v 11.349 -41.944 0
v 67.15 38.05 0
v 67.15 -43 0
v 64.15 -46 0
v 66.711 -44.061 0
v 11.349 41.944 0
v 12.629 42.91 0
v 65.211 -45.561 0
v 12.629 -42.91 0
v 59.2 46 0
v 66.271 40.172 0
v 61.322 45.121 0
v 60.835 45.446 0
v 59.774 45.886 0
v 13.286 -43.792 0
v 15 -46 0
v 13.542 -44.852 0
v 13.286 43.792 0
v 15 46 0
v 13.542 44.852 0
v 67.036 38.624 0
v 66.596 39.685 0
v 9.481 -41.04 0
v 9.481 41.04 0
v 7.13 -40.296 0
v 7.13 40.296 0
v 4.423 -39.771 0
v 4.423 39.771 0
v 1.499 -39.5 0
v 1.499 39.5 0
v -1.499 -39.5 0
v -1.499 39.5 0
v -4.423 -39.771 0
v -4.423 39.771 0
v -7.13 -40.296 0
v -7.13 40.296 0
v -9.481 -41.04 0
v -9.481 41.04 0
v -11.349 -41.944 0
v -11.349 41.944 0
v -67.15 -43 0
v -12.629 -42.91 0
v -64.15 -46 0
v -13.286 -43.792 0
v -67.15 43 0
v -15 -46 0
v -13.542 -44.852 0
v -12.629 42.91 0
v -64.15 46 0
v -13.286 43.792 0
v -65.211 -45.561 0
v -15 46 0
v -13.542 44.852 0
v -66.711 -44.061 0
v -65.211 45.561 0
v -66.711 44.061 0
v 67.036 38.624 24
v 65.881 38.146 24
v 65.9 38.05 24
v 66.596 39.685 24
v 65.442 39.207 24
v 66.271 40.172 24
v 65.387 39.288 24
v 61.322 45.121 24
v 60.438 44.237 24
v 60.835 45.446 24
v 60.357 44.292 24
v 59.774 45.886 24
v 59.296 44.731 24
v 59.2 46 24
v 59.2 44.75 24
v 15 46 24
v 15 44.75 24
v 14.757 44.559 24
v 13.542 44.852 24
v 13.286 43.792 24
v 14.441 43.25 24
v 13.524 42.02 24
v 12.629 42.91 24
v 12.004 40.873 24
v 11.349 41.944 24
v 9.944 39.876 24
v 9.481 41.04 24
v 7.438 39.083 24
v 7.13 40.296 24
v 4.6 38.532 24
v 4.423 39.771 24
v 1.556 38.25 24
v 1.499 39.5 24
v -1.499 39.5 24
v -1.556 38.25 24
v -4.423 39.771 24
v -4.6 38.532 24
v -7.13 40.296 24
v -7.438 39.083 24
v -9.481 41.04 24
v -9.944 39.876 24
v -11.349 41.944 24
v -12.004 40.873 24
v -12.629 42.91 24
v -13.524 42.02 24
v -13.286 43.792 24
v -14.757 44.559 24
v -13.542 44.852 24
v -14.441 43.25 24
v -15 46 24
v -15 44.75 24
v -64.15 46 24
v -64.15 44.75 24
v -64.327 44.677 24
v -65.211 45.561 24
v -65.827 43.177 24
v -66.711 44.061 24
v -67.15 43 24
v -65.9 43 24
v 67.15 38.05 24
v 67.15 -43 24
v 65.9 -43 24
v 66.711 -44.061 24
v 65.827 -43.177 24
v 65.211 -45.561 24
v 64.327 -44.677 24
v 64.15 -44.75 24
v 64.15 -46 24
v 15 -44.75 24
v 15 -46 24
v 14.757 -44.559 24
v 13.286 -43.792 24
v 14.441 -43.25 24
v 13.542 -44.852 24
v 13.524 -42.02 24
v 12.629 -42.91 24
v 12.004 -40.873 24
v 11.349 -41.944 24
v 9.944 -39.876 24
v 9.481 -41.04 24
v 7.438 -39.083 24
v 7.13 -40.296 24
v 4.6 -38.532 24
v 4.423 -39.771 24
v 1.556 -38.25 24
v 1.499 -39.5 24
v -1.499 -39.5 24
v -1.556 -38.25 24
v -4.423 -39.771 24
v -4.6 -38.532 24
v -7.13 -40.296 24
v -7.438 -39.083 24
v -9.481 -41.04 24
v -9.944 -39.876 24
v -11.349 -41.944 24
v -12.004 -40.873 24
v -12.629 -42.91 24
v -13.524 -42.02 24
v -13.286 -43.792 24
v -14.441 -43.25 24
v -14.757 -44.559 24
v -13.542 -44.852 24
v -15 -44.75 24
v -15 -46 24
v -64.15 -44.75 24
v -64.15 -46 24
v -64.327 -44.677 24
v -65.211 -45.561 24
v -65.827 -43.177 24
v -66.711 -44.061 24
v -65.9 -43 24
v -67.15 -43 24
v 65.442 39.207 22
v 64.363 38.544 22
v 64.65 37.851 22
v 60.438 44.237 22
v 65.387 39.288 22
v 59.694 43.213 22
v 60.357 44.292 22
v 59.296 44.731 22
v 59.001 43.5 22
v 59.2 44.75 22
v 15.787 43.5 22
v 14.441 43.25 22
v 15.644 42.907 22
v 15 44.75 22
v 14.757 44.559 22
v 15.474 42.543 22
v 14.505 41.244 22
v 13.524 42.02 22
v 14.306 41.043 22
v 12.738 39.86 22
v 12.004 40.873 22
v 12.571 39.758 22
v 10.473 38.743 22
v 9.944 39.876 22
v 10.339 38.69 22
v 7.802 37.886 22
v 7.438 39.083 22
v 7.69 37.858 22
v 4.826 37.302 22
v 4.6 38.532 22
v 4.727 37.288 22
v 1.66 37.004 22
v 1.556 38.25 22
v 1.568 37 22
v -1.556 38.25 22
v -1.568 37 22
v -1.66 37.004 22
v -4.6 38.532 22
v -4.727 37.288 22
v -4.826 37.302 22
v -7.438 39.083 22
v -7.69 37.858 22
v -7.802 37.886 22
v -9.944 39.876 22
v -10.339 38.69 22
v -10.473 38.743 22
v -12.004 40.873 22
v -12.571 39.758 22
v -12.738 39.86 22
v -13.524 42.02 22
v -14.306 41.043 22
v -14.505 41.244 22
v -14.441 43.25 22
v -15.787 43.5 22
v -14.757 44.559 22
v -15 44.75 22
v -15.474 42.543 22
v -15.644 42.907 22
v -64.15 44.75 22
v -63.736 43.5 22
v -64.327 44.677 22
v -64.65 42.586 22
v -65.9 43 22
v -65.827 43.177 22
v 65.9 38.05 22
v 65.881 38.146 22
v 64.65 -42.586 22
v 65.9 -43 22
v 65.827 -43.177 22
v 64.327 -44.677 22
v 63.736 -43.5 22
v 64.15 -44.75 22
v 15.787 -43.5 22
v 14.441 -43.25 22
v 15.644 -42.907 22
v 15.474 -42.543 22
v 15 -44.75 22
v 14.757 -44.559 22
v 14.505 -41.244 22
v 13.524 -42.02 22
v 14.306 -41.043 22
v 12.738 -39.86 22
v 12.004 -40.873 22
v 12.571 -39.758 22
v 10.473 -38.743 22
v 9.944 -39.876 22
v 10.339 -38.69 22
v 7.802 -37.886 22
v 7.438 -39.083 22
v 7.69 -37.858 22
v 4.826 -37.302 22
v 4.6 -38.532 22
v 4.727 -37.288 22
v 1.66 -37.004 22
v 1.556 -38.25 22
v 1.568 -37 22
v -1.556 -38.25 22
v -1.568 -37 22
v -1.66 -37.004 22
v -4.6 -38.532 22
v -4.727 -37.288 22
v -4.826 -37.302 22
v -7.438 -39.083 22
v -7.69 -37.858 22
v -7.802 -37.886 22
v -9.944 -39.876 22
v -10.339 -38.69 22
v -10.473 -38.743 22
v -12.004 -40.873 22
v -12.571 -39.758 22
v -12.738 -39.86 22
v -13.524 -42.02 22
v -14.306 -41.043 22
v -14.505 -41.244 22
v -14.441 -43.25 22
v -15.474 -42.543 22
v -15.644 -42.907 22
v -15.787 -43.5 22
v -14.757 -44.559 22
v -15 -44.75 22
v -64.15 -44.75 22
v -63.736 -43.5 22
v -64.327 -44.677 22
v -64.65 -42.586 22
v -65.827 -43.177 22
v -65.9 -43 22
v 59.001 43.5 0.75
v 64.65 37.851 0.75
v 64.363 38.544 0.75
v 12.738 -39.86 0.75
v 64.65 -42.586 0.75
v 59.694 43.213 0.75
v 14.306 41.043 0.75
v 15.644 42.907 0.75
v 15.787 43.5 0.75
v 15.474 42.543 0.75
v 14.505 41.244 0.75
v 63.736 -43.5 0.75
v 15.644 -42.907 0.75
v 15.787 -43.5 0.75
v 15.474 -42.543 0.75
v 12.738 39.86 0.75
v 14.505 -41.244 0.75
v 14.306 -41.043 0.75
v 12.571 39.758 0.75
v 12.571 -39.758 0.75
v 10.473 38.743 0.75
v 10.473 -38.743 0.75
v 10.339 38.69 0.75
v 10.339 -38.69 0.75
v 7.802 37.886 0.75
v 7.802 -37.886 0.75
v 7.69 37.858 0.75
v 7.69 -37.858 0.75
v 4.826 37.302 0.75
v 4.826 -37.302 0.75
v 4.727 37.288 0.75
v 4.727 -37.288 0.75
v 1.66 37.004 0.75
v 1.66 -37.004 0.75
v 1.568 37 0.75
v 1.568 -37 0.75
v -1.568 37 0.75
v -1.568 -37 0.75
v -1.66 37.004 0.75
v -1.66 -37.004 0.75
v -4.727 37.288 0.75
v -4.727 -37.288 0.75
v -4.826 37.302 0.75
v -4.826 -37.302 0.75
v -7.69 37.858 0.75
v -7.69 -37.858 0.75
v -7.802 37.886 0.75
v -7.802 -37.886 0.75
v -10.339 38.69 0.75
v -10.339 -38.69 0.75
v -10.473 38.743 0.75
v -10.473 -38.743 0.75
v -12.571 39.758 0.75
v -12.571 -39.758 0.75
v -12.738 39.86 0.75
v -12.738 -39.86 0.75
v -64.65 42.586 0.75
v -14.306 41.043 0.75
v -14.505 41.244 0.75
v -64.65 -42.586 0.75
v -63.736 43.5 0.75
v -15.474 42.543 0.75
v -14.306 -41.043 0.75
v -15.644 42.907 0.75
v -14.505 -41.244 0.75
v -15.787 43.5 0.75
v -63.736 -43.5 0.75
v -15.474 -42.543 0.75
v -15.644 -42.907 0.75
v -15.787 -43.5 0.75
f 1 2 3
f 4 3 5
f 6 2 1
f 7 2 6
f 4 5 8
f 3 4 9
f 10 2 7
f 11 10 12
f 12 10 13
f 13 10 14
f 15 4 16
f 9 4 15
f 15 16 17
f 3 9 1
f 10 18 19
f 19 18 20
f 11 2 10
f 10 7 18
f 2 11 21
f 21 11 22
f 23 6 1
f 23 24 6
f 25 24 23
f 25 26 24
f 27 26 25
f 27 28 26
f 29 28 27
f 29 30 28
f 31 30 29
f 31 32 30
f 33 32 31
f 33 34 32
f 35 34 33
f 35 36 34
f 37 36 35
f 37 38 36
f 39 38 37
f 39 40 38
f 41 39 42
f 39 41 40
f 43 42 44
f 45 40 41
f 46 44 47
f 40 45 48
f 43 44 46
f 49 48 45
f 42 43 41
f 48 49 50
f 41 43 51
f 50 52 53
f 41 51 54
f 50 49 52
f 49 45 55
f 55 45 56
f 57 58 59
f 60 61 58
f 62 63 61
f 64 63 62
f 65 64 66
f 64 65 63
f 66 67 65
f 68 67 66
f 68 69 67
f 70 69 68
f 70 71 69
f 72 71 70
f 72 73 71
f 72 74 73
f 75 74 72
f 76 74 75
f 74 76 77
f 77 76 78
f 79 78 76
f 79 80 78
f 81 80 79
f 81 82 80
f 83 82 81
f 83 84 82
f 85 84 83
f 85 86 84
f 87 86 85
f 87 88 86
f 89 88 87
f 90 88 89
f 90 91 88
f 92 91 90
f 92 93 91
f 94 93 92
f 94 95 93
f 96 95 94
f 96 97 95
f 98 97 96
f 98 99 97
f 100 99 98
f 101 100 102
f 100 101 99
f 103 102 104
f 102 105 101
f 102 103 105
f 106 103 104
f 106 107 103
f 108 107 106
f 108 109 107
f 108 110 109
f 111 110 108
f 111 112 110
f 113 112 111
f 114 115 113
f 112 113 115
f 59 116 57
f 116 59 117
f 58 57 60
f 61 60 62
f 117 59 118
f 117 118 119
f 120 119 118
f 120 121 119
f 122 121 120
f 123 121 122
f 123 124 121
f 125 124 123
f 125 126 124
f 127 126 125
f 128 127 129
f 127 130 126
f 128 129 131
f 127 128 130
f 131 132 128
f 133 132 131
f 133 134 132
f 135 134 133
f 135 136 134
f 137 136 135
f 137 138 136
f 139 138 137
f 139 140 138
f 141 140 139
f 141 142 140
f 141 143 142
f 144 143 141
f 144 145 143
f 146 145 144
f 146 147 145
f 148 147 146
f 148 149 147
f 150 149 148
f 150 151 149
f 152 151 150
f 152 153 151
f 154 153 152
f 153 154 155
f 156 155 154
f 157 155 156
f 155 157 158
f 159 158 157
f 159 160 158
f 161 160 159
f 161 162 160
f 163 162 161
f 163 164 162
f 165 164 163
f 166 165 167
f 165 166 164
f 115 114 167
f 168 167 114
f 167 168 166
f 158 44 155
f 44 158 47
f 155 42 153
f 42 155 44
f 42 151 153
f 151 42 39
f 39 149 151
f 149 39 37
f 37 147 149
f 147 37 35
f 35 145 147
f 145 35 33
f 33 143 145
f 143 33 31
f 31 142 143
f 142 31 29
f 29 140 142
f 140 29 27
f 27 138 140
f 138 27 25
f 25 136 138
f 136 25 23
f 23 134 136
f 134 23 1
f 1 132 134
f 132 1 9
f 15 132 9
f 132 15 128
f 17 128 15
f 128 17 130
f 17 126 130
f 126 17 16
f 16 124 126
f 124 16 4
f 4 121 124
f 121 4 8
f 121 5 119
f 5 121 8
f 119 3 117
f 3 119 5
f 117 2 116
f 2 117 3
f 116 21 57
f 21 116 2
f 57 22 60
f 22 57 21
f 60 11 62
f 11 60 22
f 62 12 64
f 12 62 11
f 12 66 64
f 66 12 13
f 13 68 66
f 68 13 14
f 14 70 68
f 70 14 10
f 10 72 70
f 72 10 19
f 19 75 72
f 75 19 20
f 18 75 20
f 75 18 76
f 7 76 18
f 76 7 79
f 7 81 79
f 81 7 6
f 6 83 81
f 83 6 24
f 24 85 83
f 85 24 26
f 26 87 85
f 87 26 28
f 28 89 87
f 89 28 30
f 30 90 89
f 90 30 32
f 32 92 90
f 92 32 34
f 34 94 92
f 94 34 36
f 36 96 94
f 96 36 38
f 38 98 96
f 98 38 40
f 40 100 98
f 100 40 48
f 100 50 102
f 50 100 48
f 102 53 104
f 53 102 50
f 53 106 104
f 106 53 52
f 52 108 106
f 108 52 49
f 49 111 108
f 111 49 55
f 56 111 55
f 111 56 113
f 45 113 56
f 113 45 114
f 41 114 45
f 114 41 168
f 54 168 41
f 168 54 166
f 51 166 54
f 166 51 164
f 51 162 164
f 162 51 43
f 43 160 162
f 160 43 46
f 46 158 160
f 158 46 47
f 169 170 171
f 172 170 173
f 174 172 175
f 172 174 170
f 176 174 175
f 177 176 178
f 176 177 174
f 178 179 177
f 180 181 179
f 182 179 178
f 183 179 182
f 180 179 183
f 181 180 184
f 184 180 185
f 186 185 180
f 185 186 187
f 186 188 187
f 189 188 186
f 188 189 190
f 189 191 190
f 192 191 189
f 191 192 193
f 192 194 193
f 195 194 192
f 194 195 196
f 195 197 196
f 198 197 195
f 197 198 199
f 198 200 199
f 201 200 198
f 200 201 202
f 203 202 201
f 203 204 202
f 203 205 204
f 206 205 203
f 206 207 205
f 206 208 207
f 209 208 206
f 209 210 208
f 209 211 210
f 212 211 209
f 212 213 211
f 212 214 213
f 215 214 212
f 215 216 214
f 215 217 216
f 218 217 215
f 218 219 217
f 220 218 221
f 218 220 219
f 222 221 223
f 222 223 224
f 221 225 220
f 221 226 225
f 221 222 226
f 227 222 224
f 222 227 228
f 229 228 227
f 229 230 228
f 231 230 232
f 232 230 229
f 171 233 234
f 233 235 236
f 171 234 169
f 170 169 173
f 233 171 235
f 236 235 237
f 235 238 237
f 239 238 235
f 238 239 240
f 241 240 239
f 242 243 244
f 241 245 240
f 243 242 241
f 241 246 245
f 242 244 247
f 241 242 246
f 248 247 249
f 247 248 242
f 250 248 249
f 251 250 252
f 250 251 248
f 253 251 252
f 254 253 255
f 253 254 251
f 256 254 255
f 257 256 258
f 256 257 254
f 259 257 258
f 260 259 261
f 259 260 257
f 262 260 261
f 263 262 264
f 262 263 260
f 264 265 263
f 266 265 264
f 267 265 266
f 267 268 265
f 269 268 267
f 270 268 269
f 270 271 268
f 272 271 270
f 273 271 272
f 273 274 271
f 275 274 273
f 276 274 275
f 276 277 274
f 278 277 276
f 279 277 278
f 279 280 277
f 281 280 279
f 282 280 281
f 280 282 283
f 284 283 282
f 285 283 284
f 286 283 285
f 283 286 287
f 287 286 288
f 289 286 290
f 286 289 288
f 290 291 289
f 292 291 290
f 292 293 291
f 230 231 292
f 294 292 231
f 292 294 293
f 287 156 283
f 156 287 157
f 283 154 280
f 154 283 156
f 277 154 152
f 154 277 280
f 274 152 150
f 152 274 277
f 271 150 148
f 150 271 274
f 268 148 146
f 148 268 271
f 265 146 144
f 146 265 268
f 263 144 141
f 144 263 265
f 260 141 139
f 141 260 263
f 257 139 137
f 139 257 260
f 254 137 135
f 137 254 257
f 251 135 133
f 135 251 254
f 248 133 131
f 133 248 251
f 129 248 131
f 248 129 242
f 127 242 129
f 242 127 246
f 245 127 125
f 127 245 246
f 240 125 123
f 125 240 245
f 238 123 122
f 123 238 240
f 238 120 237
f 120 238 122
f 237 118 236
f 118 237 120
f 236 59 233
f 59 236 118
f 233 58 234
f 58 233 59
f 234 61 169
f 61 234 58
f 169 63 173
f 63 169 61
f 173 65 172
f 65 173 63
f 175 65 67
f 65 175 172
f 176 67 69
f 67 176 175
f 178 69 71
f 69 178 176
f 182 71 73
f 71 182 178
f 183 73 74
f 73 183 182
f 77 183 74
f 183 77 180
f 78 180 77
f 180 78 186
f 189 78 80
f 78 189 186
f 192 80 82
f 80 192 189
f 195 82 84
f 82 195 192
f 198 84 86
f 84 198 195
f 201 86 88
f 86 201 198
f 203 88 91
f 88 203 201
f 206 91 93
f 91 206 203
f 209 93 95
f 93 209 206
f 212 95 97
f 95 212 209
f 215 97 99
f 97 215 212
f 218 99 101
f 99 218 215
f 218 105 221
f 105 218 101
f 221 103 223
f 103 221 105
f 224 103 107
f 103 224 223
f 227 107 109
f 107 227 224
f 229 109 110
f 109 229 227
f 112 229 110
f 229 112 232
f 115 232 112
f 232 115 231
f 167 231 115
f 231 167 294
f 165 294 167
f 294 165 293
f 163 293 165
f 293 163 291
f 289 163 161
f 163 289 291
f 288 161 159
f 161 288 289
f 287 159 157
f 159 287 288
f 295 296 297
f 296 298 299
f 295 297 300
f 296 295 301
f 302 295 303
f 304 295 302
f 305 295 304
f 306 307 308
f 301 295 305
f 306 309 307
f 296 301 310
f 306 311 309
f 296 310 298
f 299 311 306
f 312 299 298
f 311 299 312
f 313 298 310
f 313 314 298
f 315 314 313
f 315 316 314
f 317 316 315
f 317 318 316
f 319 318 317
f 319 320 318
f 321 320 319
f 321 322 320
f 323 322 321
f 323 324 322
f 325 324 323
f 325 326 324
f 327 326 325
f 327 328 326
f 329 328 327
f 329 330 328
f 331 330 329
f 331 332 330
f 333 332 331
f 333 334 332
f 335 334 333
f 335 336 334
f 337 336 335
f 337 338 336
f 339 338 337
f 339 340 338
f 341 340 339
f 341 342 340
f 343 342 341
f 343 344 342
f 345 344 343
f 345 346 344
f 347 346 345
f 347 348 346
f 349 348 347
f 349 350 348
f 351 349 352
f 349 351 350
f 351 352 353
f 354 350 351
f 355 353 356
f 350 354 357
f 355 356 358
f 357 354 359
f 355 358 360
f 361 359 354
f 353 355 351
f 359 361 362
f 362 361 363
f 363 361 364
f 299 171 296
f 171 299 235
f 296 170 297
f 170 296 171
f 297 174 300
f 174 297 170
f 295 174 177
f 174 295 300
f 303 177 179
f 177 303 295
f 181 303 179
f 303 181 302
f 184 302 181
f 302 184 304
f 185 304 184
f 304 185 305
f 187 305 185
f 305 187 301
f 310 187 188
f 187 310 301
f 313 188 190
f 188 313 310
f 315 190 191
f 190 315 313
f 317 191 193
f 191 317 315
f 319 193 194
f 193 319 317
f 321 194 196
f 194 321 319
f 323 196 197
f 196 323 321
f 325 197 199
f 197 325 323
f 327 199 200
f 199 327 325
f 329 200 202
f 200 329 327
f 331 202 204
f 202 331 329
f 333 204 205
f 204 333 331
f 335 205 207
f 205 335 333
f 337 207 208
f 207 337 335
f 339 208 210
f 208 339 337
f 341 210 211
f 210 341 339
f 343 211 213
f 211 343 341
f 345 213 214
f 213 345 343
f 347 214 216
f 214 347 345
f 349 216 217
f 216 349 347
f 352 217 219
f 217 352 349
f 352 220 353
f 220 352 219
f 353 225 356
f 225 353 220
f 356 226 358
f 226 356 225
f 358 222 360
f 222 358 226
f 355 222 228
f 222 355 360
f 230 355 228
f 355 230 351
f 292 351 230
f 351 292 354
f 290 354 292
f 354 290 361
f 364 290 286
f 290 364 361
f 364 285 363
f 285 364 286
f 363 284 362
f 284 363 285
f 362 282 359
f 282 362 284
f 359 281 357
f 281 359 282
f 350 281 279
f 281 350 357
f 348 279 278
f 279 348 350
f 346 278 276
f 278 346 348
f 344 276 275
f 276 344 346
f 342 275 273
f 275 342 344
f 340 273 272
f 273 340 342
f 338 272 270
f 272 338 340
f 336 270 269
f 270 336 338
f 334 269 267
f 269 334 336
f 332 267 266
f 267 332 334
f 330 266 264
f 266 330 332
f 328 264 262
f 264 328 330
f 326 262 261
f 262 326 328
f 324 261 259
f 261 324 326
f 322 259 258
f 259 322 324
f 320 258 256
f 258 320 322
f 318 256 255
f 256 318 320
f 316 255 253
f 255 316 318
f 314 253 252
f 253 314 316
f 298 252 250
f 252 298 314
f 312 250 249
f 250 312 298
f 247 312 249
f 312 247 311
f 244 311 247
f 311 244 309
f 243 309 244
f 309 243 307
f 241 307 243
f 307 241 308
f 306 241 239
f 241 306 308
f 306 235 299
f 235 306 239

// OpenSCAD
use <utilities.scad>;

well_plate_size = [127.8, 85.5] + [1,1]*0.5; //it's half a millimetre too big for ease of insertion/removal
wall_t = 1.5;
lip_t = 3;
holder_h = 3;
wall_h = 3;
bucket_h = 22;
d=0.05;

top_part = false;
bottom_part = true;

module well_plate(){
    difference(){
        square(well_plate_size, center=true);
        
        translate(well_plate_size/2) rotate(45) square(7, center=true);
    }
}

module finger_slots(){
    slot = [30,10+wall_t*2,0];
    sr = max(slot)/2;
    reflect([0,1,0]) translate([0,well_plate_size[1]/2+wall_t,0]) resize(slot) union(){
        translate([0,0,2]) cylinder(r1=d, r2=sr, h=bucket_h-2+d);
        translate([0,0,bucket_h]) cylinder(r=sr, h=999);
    }
}

    
module plate_holder() {
    // a thin plastic tray that fits under a multi well plate
    difference(){
        linear_extrude(holder_h + wall_h) offset(wall_t) well_plate();
        
        translate([0,0,holder_h]) linear_extrude(999) well_plate(); //this is where the well plate sits
        translate([0,0,0.75]){
            linear_extrude(999) offset(-lip_t) well_plate(); //this is the hollow under the plate
            intersection(){
                linear_extrude(999) well_plate(); //this is the wider hollow under the middle of the plate
                cube(well_plate_size[0]-30, center=true);
            }
        }
        
        translate([0,0,-bucket_h]) finger_slots();
    }
}
module plate_holder_silhouette(){
    // 2D projection of the above
    projection() plate_holder();
}

module bucket(){
    difference(){
        bwh = wall_h - 1; //height of the wall around the top of the bucket
        linear_extrude(bucket_h + bwh) offset(wall_t) plate_holder_silhouette();
        
        translate([0,0,bucket_h]) linear_extrude(999) offset(0.25) plate_holder_silhouette(); //this is where the holder sits
        translate([0,0,0.75]){
            linear_extrude(999) offset(-1) plate_holder_silhouette(); //this is the hollow under the plate
        }
    }
}

if(top_part) translate([0,0,bucket_h]) plate_holder();
if(bottom_part) bucket();
